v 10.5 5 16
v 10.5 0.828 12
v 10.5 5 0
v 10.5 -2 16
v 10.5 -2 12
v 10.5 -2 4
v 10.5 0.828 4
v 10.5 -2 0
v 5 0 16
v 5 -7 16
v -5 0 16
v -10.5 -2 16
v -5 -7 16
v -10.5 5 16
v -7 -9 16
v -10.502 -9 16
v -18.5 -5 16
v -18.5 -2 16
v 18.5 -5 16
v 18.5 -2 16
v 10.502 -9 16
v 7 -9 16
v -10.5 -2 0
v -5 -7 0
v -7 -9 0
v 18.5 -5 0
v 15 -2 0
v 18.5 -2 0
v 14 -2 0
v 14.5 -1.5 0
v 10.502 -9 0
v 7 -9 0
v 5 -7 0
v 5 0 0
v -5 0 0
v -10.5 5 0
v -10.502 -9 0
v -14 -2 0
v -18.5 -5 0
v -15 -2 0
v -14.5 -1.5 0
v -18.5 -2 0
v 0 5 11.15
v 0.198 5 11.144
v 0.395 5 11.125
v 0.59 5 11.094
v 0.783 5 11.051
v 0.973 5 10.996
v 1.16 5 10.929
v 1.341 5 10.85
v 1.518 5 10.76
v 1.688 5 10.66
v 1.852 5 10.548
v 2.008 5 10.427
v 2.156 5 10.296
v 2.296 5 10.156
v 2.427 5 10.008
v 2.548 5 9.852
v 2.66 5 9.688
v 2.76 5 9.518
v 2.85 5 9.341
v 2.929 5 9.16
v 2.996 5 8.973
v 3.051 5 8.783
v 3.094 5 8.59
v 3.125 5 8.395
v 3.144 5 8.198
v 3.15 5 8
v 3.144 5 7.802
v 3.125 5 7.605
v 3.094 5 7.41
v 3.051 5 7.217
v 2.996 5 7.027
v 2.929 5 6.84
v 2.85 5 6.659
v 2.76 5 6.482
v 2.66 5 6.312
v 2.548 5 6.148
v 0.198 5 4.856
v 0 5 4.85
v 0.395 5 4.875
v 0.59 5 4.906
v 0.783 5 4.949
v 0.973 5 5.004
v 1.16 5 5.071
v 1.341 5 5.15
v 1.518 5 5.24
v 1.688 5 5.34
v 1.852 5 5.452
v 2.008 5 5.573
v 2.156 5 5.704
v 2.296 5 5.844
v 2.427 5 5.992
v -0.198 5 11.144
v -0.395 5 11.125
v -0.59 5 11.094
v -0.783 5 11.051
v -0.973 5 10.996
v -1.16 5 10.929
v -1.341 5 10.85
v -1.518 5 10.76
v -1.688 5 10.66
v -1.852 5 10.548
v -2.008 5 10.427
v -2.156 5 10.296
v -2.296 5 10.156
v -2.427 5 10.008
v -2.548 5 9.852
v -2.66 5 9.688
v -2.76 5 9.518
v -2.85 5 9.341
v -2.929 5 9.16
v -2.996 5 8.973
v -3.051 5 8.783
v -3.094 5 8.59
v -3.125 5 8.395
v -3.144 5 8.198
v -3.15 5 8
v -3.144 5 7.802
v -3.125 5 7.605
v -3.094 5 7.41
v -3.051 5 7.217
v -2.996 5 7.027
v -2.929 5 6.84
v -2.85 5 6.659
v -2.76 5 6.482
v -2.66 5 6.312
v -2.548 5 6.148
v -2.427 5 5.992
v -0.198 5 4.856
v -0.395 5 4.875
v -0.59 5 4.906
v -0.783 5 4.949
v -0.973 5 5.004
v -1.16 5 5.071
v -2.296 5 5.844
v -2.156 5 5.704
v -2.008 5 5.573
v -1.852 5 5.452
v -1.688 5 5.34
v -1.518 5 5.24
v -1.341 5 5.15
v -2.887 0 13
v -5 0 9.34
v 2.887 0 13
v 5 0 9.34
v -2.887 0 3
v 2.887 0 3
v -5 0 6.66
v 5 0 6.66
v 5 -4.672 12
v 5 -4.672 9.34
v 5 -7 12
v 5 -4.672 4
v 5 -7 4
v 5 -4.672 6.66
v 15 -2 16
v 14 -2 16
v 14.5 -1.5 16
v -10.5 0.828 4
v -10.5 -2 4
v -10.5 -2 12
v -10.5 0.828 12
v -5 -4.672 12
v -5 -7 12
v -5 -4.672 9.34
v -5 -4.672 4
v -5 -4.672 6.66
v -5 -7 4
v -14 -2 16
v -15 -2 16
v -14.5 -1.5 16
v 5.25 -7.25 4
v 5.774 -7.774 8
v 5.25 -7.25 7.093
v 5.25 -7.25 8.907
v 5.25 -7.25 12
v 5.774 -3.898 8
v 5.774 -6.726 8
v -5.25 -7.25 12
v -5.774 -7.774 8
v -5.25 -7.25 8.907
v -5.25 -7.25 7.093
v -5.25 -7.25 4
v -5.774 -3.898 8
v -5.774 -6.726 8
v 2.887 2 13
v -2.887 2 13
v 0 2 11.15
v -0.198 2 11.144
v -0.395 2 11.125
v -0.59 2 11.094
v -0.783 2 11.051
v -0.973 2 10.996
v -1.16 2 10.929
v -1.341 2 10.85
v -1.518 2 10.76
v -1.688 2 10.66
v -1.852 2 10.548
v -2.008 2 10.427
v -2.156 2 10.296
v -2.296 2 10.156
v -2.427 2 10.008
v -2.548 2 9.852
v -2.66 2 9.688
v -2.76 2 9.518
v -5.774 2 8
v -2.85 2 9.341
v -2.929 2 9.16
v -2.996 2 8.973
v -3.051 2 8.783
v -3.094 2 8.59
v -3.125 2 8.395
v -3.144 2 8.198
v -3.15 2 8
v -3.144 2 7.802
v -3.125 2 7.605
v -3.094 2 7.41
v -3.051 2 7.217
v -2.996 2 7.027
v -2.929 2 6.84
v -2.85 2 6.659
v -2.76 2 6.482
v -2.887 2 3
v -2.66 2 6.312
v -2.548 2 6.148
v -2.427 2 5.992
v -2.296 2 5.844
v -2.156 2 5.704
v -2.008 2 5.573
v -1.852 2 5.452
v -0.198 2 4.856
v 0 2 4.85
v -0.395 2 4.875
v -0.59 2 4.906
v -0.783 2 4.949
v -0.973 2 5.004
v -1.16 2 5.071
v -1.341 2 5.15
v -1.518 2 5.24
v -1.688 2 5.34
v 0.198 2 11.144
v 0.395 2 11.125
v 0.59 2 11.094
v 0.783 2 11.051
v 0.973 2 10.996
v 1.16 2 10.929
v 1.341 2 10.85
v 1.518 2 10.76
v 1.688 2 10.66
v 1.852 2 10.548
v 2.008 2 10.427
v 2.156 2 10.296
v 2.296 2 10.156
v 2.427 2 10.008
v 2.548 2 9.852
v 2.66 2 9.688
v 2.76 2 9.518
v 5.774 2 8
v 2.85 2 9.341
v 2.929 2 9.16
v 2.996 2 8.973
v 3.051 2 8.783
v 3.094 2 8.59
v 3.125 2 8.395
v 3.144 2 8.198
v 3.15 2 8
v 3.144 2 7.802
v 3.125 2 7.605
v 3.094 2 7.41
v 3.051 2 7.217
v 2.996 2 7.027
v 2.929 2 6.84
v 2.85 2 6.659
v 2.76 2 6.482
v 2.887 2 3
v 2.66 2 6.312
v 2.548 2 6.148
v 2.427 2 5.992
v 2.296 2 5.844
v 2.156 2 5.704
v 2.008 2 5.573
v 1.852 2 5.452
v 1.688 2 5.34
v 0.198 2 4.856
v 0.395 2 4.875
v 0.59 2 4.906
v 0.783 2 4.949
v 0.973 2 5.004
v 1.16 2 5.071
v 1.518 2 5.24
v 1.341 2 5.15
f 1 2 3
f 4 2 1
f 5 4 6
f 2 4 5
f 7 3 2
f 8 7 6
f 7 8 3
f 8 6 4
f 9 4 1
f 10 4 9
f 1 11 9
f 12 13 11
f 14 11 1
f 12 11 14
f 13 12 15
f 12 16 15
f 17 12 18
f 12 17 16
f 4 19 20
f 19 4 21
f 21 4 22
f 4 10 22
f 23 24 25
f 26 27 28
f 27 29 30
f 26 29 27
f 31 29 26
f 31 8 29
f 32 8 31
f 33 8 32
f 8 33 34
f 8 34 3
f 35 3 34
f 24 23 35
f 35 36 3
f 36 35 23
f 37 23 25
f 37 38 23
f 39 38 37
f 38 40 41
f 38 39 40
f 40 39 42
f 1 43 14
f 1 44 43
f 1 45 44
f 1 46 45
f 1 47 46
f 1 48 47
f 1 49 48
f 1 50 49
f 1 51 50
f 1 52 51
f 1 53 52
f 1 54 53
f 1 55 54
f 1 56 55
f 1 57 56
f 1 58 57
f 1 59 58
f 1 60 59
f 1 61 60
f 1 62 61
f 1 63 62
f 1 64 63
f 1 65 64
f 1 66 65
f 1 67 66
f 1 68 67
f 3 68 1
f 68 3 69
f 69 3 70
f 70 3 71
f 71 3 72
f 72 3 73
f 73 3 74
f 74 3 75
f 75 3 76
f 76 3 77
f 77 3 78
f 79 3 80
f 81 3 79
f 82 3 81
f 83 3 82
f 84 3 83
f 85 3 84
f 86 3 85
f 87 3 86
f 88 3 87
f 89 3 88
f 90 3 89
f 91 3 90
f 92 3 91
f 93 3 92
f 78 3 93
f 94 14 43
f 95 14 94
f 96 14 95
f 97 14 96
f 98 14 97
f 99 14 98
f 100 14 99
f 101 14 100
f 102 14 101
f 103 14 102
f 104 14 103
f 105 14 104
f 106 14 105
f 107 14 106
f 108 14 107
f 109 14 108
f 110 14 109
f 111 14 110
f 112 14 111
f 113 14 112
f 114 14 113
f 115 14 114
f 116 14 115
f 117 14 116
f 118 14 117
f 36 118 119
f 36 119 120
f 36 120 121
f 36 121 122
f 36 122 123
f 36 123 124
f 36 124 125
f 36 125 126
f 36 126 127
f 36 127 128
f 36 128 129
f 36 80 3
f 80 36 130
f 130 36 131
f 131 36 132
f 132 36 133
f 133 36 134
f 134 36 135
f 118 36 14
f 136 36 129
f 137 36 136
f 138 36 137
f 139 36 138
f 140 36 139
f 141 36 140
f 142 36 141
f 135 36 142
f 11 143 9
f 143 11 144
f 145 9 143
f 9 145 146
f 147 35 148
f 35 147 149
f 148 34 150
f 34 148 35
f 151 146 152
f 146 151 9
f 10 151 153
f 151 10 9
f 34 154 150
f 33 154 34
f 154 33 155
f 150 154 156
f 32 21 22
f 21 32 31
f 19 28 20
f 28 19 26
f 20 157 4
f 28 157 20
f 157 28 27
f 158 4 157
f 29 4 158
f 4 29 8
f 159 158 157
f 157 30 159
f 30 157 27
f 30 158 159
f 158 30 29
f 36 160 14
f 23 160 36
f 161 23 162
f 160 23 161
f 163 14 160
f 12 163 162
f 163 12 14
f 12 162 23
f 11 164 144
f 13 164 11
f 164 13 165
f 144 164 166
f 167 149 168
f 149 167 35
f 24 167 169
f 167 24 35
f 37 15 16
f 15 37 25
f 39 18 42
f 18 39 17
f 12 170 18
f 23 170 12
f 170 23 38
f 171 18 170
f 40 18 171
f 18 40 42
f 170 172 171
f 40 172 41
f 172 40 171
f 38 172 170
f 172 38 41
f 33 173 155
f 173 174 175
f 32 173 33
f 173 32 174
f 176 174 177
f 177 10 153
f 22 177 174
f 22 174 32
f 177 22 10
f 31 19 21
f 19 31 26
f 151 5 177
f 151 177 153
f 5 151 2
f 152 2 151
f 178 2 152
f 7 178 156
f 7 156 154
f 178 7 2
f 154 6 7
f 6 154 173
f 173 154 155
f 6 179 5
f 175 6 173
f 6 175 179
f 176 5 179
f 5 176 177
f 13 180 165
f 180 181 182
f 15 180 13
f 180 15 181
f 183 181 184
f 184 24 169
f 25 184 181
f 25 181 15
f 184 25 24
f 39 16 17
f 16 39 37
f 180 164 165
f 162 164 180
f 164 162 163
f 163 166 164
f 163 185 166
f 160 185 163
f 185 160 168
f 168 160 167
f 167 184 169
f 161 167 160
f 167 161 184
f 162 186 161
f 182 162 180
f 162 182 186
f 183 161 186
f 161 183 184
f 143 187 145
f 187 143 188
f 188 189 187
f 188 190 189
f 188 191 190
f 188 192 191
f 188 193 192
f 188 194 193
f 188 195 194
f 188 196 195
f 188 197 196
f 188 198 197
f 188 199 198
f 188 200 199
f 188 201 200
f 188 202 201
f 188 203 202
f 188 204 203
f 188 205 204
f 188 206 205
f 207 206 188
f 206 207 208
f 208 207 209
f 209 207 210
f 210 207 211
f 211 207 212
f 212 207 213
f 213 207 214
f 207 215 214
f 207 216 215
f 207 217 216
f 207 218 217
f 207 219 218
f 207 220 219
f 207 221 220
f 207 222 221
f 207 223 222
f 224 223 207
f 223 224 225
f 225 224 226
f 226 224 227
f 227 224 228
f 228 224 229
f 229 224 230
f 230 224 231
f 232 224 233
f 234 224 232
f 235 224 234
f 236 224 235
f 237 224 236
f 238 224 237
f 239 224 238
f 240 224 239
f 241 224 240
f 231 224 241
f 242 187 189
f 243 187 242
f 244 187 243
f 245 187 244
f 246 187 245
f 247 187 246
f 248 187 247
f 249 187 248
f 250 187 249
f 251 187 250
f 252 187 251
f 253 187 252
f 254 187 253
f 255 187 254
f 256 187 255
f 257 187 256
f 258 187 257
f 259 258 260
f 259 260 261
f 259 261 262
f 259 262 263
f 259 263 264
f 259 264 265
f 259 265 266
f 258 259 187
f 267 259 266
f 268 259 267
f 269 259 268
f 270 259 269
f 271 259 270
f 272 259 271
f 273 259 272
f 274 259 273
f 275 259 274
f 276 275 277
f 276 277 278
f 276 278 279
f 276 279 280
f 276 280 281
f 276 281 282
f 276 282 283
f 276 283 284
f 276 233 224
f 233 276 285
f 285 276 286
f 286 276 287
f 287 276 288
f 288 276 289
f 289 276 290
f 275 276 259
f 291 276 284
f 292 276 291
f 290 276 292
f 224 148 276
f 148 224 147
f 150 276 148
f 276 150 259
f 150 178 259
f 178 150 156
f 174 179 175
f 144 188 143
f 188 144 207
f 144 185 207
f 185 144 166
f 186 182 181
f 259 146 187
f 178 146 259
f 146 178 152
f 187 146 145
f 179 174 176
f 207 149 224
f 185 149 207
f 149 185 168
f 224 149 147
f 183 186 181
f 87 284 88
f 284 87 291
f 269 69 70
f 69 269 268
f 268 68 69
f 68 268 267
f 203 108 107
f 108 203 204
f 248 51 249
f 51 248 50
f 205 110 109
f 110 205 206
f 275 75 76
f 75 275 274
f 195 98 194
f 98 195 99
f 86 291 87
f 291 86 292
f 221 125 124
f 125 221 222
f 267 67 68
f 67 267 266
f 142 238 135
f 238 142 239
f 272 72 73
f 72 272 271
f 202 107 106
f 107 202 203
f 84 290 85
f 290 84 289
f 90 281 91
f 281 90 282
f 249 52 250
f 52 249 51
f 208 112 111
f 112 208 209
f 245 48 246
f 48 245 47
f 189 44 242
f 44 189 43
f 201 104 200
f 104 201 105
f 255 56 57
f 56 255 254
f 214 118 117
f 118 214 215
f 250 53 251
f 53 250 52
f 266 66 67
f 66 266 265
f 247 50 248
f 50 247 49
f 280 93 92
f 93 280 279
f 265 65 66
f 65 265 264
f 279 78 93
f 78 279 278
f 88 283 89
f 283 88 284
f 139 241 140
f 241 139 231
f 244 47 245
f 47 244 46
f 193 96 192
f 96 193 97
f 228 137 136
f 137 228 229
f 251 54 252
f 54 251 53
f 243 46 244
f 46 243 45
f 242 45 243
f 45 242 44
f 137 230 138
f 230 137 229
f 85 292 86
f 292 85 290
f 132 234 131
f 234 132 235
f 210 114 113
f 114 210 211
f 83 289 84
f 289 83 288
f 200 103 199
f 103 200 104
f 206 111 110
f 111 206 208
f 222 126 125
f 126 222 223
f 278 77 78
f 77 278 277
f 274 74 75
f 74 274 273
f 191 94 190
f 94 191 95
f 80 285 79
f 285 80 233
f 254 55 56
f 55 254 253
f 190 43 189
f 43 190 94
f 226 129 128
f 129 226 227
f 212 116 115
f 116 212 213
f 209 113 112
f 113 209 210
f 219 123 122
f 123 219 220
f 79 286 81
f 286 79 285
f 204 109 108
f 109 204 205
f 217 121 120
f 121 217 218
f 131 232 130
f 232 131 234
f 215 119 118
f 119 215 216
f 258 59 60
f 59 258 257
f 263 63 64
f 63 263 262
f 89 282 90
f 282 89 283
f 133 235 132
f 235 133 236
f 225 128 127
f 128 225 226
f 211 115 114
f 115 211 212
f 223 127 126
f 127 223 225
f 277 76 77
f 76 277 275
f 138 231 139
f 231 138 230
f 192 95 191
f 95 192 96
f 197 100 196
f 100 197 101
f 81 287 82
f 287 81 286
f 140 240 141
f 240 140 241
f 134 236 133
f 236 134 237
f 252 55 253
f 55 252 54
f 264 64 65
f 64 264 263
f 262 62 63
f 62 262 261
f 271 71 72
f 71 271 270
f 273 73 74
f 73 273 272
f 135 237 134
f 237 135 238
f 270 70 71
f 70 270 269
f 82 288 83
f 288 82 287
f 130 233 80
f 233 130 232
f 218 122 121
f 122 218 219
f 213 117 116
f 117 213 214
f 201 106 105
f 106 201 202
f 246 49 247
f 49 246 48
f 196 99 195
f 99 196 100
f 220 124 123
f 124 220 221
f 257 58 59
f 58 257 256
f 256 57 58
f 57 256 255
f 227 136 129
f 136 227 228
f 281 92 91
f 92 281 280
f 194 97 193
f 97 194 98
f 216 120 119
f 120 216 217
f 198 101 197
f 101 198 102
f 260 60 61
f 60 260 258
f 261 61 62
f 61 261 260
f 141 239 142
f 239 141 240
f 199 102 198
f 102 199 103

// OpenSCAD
// Created from Code_Ybelt_holderB.stl
// https://github.com/Mecan0/Code
// By J.Rodigo (www.jra.so)
// Licence Creative commons atribution & share alike.

/**************************/
// Parámetros de la pieza  /
/**************************/

//Características del tornillo
dTor = 6.3;		// Diámetro de la rosca (6.3)
hHex = 10;		// Altura entre caras planas de la tuerca (5.8)

// Media Pieza
module mpieza(){
	// Base (X)
	cube([10.5, 5, 16]);
	// Altura (Y)
	translate([5, -9, 0])
	cube([5.5, 9, 16]);
	// Saliente (X)
	translate([5, -9, 0])
	cube([13.5, 7, 16]);
	// Diente
	translate([14.5, -1.5, 0])
	rotate( 225 ,[0, 0, 1])
	cube([1, 1, 16]);
}

// Operaciones para media pieza
module moperaciones(){
	// Chaflán interior
	translate([5, -7, -1])
	rotate( 225 ,[0, 0, 1])
	cube([3, 3, 18]);
	// Chaflán exterior 
	translate([18.5, -5, -1])
	rotate( 206.57 ,[0, 0, 1])
	cube([10, 4, 18]);
	// Vaciado interior para el paso de la correa 
	translate([5, -7.5, 4])
	rotate( 45 ,[0, 0, 1])
	cube([10, 2, 8]);
}

// Generar un hexágono circunscrito (Diametro,altura) 
module hexagono(d,h){ 
	for (a = [0, 60,120]){ 
		rotate( a, [0, 0, 1])
		cube([d, d*tan(30), h], center = true);
	}
}

// Alojamiento de la tuerca y taladro para el tornillo
module tuerca(){
	// Taladro para el tornillo
	translate([0, -1, 8])
	rotate( -90, [1, 0, 0])
	cylinder(h = 7, r = dTor/2, $fn=100);
	// Hueco para la tuerca 
	translate([0, -3.5, 8])
	rotate( 90, [1, 0, 0])
	rotate( 90, [0, 0, 1])
	hexagono(hHex, 11);
}

// Creamos la pieza a partir de las operacione
module pieza(){
	difference () {
		union() {
			// Pieza situada en +X
			mpieza();
			// Pieza situada en -X
			mirror([ 1, 0, 0 ])
			mpieza();
		}	
		union() {
			// Operaciones situadas en +X
			moperaciones();
			// Operaciones situadas en -X
			mirror([ 1, 0, 0 ])
			moperaciones();
	
			// Operaciones únicas
			tuerca();

		}// Union end	
	}// diff. end
}// module end


// Generamos la pieza!!

	pieza();
